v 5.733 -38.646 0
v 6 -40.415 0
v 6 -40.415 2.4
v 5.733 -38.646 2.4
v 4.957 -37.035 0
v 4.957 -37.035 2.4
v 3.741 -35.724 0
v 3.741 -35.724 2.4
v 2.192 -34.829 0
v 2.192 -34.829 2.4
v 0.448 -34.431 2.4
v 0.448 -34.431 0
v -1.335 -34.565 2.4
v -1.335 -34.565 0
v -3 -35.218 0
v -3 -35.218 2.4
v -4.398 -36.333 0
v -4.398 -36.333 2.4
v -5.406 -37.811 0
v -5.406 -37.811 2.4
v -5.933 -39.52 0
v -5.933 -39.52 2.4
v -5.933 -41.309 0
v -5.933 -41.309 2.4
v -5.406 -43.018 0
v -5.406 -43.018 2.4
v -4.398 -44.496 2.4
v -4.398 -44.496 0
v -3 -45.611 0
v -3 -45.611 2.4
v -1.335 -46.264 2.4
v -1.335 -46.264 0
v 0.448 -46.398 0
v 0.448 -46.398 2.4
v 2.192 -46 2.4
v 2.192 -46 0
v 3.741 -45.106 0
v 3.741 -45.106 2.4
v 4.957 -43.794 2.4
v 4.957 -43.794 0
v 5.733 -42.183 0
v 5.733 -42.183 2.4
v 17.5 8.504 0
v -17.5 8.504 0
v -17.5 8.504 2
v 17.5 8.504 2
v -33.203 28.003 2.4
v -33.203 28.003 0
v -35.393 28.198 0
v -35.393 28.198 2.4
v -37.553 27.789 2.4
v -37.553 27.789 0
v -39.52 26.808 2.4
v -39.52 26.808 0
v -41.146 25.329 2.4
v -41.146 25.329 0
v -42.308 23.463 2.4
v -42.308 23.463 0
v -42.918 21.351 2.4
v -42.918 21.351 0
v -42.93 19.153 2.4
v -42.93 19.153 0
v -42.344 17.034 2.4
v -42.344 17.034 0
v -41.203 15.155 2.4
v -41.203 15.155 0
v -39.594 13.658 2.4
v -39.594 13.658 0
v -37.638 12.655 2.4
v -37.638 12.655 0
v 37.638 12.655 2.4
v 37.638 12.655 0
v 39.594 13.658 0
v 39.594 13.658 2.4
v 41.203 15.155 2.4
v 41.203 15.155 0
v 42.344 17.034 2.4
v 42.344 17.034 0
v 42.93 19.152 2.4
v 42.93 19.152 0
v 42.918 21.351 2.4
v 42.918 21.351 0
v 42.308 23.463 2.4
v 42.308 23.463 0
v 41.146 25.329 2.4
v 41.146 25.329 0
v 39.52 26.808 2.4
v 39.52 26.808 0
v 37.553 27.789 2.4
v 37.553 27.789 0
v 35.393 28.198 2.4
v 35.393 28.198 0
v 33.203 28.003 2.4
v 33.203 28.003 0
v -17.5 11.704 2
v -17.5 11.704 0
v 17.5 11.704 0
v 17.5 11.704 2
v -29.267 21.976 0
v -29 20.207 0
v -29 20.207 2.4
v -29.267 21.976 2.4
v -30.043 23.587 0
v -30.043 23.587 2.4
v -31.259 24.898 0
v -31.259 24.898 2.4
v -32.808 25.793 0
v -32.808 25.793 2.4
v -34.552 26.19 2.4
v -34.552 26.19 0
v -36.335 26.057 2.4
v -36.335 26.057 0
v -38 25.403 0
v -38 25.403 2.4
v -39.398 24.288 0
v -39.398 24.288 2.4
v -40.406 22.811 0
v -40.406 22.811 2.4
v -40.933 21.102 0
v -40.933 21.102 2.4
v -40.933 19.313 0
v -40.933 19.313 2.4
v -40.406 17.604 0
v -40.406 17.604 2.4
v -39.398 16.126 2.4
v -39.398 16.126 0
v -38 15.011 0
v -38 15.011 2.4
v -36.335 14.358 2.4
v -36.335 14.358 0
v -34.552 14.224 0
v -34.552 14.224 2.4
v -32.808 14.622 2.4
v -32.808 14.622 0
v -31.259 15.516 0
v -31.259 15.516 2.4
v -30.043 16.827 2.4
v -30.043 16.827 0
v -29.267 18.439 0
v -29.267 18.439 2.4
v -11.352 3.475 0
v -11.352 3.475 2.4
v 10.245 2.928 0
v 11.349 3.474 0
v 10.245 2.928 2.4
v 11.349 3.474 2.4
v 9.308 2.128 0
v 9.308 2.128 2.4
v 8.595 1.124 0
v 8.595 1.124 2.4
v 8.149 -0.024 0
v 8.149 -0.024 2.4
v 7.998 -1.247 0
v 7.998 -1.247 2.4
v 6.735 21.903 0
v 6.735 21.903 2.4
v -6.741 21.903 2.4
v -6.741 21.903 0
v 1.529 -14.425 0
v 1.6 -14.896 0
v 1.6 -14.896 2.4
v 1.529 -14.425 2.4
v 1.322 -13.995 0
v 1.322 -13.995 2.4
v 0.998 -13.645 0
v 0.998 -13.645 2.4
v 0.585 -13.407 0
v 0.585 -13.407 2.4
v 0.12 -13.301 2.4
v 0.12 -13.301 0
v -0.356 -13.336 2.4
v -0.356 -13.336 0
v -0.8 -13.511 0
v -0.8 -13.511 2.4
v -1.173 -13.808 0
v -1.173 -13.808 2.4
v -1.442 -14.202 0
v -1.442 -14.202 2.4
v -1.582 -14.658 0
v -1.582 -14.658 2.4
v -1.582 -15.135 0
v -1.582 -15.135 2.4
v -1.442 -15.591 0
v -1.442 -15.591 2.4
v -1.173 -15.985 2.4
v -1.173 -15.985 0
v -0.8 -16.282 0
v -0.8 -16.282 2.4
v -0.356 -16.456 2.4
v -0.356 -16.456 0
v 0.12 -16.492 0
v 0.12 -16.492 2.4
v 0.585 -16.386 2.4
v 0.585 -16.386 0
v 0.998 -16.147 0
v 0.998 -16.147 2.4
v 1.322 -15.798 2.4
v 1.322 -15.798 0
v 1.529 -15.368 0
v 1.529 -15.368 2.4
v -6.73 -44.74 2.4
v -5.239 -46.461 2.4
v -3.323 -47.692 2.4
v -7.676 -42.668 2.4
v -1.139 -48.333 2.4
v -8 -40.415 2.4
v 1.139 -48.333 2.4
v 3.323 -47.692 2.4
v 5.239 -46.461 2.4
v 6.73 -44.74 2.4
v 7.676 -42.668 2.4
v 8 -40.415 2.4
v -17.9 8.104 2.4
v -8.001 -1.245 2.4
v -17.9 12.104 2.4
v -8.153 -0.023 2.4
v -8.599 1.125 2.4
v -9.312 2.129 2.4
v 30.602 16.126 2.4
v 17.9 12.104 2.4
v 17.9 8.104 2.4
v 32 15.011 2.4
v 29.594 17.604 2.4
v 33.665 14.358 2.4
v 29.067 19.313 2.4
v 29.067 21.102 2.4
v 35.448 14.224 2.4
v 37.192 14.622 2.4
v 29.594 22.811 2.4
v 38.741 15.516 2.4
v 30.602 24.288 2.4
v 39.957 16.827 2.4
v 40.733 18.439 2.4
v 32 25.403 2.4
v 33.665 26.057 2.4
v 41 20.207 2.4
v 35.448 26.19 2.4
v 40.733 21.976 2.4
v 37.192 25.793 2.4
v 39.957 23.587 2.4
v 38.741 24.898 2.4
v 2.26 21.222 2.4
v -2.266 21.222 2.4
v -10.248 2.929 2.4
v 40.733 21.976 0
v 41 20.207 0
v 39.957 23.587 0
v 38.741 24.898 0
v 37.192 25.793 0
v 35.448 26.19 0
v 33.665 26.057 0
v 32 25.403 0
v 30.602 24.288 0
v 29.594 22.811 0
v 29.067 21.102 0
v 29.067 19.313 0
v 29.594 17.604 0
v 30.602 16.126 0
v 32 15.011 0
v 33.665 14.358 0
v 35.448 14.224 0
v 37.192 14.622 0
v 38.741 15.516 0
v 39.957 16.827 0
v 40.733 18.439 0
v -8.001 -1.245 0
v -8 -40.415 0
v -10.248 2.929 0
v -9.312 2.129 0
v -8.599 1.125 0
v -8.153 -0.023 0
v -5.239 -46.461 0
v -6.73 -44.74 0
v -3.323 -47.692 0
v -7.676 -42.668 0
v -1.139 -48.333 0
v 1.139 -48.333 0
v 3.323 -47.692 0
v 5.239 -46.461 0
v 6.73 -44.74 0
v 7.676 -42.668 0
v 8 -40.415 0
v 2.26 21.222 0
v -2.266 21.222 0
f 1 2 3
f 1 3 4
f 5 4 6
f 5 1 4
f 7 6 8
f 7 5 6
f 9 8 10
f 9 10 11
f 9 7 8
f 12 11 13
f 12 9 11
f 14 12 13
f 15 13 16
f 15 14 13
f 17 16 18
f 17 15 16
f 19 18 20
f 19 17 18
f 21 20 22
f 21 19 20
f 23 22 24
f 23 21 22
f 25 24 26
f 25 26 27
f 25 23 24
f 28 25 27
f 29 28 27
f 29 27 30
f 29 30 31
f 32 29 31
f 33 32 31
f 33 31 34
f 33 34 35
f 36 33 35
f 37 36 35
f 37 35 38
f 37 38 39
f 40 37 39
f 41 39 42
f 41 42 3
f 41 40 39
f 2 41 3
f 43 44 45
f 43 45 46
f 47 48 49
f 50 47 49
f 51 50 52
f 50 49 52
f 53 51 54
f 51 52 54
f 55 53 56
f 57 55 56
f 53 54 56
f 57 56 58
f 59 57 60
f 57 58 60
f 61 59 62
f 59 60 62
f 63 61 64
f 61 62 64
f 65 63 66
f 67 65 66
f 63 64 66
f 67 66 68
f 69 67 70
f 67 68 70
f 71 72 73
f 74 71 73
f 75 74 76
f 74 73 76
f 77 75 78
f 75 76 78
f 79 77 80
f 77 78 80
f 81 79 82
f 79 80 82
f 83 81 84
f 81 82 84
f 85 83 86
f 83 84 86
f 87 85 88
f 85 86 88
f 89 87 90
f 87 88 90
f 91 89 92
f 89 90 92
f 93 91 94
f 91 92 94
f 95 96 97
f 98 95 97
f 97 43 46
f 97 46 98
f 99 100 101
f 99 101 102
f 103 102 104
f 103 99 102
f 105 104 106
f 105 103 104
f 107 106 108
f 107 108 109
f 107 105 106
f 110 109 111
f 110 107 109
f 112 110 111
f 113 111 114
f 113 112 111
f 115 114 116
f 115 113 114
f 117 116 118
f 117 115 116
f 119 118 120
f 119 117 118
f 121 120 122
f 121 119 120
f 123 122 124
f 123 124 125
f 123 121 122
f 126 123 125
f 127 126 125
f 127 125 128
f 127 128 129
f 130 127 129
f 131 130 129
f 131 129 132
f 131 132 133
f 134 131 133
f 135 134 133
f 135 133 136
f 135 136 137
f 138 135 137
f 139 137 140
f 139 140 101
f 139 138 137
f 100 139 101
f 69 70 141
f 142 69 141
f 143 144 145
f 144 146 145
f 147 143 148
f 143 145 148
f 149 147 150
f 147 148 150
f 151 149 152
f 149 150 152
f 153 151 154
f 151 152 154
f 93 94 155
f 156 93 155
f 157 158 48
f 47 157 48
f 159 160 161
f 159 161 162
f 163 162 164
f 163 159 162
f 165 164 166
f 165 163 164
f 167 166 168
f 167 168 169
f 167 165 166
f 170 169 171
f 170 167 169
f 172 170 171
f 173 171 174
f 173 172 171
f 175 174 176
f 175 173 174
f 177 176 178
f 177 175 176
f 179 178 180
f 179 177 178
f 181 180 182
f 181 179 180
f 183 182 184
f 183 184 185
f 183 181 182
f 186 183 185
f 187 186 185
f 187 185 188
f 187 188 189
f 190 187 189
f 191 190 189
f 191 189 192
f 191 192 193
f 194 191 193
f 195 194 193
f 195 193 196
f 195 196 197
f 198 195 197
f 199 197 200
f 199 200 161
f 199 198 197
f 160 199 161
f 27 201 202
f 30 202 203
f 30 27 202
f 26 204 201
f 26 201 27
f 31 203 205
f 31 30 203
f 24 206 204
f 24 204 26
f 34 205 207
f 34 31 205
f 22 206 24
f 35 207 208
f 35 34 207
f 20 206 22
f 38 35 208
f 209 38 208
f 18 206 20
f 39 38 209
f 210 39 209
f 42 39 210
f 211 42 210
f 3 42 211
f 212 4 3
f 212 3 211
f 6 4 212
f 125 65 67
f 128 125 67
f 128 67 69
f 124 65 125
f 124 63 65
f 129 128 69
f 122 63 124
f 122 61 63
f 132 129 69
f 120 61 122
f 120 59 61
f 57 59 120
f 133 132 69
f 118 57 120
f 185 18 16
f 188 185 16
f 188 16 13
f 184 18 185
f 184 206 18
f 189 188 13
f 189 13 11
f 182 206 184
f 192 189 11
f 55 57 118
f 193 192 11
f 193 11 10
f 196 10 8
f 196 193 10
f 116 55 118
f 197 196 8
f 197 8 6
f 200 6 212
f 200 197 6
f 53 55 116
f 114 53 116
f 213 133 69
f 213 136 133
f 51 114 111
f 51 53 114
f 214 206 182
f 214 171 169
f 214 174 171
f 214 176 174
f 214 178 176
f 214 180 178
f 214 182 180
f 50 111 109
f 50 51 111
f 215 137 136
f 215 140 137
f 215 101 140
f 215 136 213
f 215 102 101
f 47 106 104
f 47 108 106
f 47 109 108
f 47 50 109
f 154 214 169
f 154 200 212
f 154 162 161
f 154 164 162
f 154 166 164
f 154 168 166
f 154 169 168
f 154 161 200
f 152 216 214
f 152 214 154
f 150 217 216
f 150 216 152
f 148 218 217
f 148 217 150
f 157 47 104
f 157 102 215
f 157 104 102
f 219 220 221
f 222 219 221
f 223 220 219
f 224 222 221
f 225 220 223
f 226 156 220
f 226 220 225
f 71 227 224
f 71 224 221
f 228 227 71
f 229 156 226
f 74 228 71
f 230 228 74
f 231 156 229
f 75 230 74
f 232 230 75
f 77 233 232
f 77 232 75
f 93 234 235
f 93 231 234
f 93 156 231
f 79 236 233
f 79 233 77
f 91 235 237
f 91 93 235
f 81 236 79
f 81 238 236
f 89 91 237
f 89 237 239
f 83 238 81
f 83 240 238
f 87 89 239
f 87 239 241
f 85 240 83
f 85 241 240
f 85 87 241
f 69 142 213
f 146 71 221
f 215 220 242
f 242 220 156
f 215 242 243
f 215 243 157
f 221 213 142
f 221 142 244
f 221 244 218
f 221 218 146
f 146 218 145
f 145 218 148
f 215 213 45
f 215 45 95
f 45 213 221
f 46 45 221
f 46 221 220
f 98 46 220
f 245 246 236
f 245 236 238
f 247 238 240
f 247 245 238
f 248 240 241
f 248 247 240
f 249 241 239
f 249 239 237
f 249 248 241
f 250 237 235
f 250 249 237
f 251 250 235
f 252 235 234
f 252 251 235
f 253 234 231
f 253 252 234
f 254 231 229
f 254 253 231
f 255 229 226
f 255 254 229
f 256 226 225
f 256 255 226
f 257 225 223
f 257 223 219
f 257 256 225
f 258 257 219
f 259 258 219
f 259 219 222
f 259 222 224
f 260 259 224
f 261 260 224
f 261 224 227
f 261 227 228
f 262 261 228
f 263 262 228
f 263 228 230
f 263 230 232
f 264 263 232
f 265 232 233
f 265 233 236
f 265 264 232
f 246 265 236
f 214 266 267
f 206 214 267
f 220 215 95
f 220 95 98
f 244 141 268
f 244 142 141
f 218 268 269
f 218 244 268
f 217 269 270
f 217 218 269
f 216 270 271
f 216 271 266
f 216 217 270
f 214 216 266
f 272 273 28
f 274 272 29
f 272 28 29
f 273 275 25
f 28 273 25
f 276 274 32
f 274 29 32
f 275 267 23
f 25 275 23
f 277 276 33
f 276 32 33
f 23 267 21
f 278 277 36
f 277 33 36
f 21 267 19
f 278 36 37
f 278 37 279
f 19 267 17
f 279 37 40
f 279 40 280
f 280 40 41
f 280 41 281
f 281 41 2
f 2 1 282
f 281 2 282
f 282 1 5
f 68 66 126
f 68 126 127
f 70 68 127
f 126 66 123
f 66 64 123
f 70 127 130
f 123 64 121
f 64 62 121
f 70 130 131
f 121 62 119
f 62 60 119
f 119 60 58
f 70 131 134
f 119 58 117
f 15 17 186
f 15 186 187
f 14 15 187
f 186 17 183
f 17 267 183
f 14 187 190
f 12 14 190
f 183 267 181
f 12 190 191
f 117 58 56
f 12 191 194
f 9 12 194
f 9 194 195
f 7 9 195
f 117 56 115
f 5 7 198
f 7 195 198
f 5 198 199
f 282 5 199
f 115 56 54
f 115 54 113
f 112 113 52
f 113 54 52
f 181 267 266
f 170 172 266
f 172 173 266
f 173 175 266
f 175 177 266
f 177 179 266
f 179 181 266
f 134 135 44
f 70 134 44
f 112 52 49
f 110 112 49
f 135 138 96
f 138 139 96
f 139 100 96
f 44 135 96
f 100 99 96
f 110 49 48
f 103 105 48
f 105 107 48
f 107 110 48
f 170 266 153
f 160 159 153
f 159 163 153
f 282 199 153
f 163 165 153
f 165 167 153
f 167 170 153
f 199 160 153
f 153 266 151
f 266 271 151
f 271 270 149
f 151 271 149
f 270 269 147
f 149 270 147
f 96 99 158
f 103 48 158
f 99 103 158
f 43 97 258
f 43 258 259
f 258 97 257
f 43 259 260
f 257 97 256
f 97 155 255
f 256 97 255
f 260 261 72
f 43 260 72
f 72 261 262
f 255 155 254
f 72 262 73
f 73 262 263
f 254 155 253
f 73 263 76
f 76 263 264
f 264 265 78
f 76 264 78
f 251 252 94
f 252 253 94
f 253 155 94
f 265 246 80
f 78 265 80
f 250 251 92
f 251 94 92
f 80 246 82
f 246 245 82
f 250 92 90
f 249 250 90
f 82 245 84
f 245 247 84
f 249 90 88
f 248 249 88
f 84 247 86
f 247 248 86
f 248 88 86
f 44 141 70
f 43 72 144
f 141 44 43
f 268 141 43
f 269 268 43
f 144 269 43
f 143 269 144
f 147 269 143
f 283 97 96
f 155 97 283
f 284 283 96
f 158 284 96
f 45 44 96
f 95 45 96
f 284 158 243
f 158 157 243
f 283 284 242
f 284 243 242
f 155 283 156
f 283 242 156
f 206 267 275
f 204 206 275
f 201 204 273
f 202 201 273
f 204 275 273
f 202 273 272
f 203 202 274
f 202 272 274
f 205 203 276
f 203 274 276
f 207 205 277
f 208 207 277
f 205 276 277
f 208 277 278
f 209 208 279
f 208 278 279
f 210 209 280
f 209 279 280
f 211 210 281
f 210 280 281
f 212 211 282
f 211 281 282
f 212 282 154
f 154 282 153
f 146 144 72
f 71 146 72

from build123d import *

# Parameters (mm, degrees)
F0_R     = 6
F0_R_2   = 1.6
F0_W     = 35
F0_H     = 3.2
F1_DEPTH = 2.4
F2_SIZE  = 0.4
F3_R     = 30
F4_R     = 5


with BuildPart() as f1:
    # F0 (on Top) → F1 (new body)
    with BuildSketch(Plane.XY):
        with BuildLine():
            Line((-8.000963252, 2.3046399066), (-8, -40.4145188433))
            ThreePointArc((-8, -40.4145188433), (0, -48.4145188433), (8, -40.4145188433))
            Line((8, -40.4145188433), (7.9974217916, 2.303660399))
            Line((7.9974217916, 2.303660399), (37.6375477343, 12.6545551411))
            ThreePointArc((37.6375477343, 12.6545551411), (42.6856959969, 22.427637102), (33.2034437111, 28.002923954))
            Line((33.2034437111, 28.002923954), (-0.0031576851, 20.3502692862))
            Line((-0.0031576851, 20.3502692862), (-33.2031192071, 28.002849163))
            ThreePointArc((-33.2031192071, 28.002849163), (-42.6856411927, 22.4278267944), (-37.6376061638, 12.654575546))
            Line((-37.6376061638, 12.654575546), (-8.000963252, 2.3046399066))
        make_face()
        with Locations((0, -40.4145188433)):
            Circle(F0_R, mode=Mode.SUBTRACT)
        with Locations((0, -14.8963702892)):
            Circle(F0_R_2, mode=Mode.SUBTRACT)
        with Locations((-35, 20.2072594216)):
            Circle(F0_R, mode=Mode.SUBTRACT)
        with Locations((0, 10.1036297108)):
            Rectangle(F0_W, F0_H, mode=Mode.SUBTRACT)
        with Locations((35, 20.2072594216)):
            Circle(F0_R, mode=Mode.SUBTRACT)
    extrude(amount=F1_DEPTH)

    # F2
    f2_edges = [f1.edges().sort_by_distance(p)[0] for p in [
        (-17.5, 10.10363, 2.4),
        (0, 11.70363, 2.4),
        (0, 8.50363, 2.4),
        (17.5, 10.10363, 2.4),
    ]]
    chamfer(f2_edges, length=F2_SIZE)

    # F3
    f3_edges = [f1.edges().sort_by_distance(p)[0] for p in [
        (-0.003158, 20.350269, 1.2),
    ]]
    fillet(f3_edges, radius=F3_R)

    # F4
    f4_edges = [f1.edges().sort_by_distance(p)[0] for p in [
        (7.997422, 2.30366, 1.2),
        (-8.000963, 2.30464, 1.2),
    ]]
    fillet(f4_edges, radius=F4_R)


solid = f1.part
